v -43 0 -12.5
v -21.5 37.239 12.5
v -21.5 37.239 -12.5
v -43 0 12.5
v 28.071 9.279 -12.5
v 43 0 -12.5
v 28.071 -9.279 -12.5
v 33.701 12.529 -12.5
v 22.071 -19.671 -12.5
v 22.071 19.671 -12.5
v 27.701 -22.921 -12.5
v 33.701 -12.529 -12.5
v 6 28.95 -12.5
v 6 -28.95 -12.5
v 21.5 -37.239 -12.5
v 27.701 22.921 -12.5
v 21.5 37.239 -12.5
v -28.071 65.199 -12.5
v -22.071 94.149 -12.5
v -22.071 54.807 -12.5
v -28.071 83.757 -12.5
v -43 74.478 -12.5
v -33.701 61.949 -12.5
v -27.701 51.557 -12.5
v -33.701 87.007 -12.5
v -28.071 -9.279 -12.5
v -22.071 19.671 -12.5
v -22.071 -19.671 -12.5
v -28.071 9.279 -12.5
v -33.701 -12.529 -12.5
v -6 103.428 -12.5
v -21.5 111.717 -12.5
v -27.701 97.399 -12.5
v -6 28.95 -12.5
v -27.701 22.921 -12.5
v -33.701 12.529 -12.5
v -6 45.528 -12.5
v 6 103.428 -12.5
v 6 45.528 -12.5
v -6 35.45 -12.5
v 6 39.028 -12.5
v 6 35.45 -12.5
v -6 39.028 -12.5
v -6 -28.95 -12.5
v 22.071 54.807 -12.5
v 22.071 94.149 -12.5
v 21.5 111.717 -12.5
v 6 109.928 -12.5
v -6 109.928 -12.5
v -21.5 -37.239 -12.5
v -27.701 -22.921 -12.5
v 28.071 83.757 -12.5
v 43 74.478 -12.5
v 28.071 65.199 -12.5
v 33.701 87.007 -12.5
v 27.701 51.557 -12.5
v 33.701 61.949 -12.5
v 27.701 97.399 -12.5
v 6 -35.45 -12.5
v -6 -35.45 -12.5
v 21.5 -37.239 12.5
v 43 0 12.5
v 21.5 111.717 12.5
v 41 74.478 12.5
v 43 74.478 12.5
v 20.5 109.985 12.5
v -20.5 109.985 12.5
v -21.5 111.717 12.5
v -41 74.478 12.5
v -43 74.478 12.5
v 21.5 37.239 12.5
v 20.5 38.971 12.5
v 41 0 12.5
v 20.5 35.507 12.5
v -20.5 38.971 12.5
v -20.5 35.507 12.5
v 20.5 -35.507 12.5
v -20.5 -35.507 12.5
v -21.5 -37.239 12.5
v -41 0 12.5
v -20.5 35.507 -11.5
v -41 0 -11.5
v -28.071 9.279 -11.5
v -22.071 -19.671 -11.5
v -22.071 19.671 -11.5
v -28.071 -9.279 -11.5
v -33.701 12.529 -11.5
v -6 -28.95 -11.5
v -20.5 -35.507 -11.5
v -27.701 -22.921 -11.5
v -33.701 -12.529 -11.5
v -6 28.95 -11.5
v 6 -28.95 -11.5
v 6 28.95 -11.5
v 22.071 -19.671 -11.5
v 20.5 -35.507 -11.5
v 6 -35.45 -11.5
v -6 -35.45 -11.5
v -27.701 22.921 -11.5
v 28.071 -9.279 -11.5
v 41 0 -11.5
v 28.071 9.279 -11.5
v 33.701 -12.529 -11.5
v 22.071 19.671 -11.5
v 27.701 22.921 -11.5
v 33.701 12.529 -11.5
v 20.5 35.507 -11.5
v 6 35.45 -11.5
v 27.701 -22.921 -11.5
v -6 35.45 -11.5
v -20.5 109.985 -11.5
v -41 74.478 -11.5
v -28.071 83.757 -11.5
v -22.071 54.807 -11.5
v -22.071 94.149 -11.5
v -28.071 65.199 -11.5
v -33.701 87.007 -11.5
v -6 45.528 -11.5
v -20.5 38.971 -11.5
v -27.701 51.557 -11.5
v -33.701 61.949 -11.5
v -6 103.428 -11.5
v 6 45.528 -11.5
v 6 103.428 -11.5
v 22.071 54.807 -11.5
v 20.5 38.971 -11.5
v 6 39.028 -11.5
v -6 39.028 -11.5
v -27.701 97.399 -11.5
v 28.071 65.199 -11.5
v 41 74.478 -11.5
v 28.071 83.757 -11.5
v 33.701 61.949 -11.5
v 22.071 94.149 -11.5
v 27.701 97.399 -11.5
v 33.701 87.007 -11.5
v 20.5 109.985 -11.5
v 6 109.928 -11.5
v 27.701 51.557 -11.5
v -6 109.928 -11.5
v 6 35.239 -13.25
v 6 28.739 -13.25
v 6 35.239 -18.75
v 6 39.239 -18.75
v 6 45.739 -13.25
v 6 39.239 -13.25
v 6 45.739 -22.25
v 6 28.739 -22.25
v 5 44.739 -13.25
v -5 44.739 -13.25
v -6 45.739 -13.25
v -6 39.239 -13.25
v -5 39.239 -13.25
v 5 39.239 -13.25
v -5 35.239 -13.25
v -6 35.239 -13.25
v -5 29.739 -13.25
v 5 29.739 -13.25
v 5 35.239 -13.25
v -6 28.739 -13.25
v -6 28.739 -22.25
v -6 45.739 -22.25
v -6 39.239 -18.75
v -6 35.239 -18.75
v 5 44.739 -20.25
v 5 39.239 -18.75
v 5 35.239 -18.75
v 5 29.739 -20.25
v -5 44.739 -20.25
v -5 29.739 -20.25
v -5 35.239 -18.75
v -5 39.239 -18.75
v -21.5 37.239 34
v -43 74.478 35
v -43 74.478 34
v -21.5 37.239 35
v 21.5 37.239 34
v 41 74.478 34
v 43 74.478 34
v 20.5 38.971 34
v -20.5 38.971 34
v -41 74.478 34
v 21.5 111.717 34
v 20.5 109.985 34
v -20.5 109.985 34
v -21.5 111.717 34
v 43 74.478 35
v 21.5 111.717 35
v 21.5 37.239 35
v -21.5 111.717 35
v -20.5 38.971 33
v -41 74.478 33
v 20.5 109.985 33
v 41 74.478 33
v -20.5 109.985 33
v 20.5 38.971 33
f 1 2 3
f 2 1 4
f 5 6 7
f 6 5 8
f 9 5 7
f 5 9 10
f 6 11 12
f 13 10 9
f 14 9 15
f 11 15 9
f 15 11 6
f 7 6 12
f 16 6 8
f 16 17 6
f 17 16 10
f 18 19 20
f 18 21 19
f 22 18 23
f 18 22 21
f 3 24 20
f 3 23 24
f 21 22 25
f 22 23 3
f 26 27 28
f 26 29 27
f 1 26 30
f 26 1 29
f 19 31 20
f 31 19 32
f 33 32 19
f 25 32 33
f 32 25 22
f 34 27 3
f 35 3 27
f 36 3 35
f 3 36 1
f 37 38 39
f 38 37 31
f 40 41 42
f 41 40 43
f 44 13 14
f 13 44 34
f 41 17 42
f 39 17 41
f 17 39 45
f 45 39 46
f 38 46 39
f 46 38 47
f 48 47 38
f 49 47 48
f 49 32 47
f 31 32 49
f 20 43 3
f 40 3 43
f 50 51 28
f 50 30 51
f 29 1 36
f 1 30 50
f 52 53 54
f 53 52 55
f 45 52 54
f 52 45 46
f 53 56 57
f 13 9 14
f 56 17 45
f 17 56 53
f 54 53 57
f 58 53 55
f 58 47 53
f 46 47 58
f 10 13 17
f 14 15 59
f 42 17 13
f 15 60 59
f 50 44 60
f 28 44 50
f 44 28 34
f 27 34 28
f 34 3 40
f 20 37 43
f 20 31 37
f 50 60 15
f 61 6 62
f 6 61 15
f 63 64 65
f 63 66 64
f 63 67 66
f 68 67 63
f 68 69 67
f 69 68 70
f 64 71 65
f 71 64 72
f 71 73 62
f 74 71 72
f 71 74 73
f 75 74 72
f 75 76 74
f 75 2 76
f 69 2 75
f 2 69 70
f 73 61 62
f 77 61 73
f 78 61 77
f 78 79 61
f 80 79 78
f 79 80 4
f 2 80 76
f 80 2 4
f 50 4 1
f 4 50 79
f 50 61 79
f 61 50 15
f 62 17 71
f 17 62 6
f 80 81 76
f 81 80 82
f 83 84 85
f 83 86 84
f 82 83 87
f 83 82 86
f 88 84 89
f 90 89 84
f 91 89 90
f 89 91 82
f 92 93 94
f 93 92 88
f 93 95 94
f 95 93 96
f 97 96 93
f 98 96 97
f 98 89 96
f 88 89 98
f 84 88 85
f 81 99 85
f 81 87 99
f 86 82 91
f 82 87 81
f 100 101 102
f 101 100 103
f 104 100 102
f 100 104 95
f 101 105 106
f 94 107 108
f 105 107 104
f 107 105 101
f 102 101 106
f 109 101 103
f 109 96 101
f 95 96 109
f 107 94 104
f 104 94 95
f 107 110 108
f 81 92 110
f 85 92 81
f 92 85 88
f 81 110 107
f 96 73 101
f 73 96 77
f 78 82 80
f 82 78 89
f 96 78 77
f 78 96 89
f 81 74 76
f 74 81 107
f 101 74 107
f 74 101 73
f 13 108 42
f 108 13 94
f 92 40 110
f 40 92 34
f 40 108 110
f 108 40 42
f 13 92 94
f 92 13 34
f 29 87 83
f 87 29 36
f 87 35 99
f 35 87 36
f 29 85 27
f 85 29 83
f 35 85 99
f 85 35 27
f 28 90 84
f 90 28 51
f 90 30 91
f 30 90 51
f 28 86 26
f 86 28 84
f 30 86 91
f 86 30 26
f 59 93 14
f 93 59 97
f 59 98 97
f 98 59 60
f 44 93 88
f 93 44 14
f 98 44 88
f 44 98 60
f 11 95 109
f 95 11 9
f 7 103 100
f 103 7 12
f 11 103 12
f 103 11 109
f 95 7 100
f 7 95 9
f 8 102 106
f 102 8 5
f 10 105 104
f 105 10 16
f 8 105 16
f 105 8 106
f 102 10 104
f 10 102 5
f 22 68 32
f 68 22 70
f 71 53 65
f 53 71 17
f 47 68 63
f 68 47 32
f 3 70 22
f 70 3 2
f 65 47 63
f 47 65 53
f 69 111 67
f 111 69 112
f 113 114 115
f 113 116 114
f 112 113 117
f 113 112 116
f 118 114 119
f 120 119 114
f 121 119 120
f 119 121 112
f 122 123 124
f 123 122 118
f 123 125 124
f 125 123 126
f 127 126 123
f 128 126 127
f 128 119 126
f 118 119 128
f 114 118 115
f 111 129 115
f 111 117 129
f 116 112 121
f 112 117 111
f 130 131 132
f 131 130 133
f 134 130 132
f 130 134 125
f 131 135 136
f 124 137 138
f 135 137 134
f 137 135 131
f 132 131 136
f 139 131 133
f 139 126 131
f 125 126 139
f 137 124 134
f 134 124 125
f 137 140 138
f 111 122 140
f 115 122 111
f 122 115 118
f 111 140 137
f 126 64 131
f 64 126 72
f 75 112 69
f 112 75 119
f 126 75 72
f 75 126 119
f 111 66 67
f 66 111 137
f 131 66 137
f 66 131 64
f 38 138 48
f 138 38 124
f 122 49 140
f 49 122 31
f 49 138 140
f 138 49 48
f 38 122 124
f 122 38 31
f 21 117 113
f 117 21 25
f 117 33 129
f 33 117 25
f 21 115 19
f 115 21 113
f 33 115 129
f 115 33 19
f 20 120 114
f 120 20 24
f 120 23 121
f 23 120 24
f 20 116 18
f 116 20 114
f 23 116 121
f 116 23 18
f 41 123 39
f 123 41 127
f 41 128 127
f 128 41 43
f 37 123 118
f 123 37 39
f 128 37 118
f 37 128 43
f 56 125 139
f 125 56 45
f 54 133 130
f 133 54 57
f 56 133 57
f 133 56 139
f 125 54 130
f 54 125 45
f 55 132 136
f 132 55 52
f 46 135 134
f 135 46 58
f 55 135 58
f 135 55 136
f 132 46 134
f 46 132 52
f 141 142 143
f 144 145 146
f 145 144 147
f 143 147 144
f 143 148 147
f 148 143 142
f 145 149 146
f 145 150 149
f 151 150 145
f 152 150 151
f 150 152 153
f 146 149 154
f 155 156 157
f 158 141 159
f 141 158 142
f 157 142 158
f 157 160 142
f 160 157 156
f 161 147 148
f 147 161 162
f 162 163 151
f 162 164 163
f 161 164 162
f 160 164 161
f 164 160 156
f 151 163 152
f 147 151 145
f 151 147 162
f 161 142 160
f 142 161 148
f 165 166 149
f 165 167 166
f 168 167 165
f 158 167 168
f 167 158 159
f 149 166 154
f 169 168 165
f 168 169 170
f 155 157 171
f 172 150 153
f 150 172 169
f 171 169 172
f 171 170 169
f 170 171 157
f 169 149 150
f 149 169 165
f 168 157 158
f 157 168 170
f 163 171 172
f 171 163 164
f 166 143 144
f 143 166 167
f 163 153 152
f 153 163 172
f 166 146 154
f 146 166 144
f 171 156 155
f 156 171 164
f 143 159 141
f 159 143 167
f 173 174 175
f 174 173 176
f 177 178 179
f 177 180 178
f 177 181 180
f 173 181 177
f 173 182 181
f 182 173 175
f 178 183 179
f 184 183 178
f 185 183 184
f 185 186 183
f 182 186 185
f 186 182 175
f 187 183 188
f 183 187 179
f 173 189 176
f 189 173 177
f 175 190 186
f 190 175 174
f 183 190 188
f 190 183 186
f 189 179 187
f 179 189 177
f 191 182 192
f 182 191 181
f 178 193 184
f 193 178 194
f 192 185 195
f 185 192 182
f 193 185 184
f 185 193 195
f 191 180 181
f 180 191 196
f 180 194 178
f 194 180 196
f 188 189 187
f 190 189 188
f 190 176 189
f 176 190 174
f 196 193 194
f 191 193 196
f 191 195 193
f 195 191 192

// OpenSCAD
// file: cololight_tribute_header.scad
/* 
Cololight like hexagon lights
*/

/* 
variable definitions
*/

hex_height=25;
hex_lon_d=86;
hex_short_d=74.478;
hex_incir_rad=43;
hex_lip_depth=1;
diffuser_thickness=2;
diffuser_lip_width=0;
diffuser_edge_thickness=1;
diffuser_clip_thickness=4;
diffuser_clip_wall_thickness=1;
base_thickness=1;
edge_thickness=2;
pin_header_width=8;
pin_header_height=2.5;
clip_mouth_width=12;
clip_mouth_length=6.5;
clip_edge_offset=4.3;

clip_width=12;
clip_length=(2*clip_mouth_length)+(2*edge_thickness);
clip_height=8+base_thickness;
// main file
/* 
Cololight like hexagon lights
*/

include <cololight_tribute_header.scad>

/*
hexagonal light housing
*/

color("grey") 
group() {
    difference() {
        
        difference() {
        
            difference() {
                linear_extrude(height = hex_height, center = true, convexity = 10, twist = 0){
                circle(r=hex_incir_rad, $fn=6);
                }
                translate([0,0,base_thickness]){
                    linear_extrude(height = hex_height, center = true, convexity = 10, twist = 0){
                        circle(r=hex_incir_rad-edge_thickness, $fn=6);
                    }
                }
            }
            
            translate([0,0,(hex_height/2)]){
                linear_extrude(height = diffuser_thickness, center = true, convexity = 10, twist = 0){
                    circle(r=hex_incir_rad-(edge_thickness-diffuser_lip_width), $fn=6);
                }
            }
        }
        
        
        for(a=[0:1:5]){
            rotate([0,0,a*60]) translate([0,hex_incir_rad-clip_mouth_length-clip_edge_offset
        ,0]) {
                cube( size=[clip_mouth_width,clip_mouth_length,hex_height*2], center=true);
            }    
        }    
    
    
        
    }
}

/*
another housing tranlsated in space to show clip interaction
*/

translate([0,hex_short_d,0]){
color("grey", 0.5) 
group() {
    difference() {
        
        difference() {
        
            difference() {
                linear_extrude(height = hex_height, center = true, convexity = 10, twist = 0){
                circle(r=hex_incir_rad, $fn=6);
                }
                translate([0,0,base_thickness]){
                    linear_extrude(height = hex_height, center = true, convexity = 10, twist = 0){
                        circle(r=hex_incir_rad-edge_thickness, $fn=6);
                    }
                }
            }
            
            translate([0,0,(hex_height/2)]){
                linear_extrude(height = diffuser_thickness, center = true, convexity = 10, twist = 0){
                    circle(r=hex_incir_rad-(edge_thickness-diffuser_lip_width), $fn=6);
                }
            }
        }
        
        
        for(a=[0:1:5]){
            rotate([0,0,a*60]) translate([0,hex_incir_rad-clip_mouth_length-clip_edge_offset
        ,0]) {
                cube( size=[clip_mouth_width,clip_mouth_length,hex_height*2], center=true);
            }    
        }    
    
    
        
    }
}
}
/*
translate([0,hex_short_d/2,+30.5]){
    cube( size=[clip_width,clip_length,clip_height], center=true);
}
*/

    
/* 
clip definition
*/
    
// uncomment following and curly to move into place
//translate([0,hex_short_d/2,-11.75]){
translate([0,hex_short_d/2,-17.75]){
color("grey")
group() {
    difference(){
        difference(){
            cube( size=[clip_width,clip_length,clip_height], center=true);

            translate([0,0,edge_thickness]){
                cube( size=[clip_width-edge_thickness,clip_length-edge_thickness,clip_height], center=true);
            }
        }
        
        translate([0,0,base_thickness+pin_header_height]){
            cube( size=[clip_width+2,edge_thickness*2,clip_height], center=true);
            }
            }
            
}
}

/*
diffuser definition
*/
rotate([180,0,0]){
translate([0,-hex_short_d,-35]){
color("white")
    
group() {
    difference() {
    
        color("green")
        linear_extrude(height = diffuser_thickness, center = false, convexity = 10, twist = 0){
            circle(r=hex_incir_rad, $fn=6);
        }
    
    /* 
    diffuser cutting tool definition
    */
        
    translate([0,0,diffuser_edge_thickness]){
        group(){
          
            difference(){
                color("blue")
                linear_extrude(height = diffuser_thickness*2, center = false, convexity = 10, twist = 0){
                    circle(r=hex_incir_rad, $fn=6);
                }
                color("red")
                linear_extrude(height = diffuser_thickness*2, center = false, convexity = 10, twist = 0){
                    circle(r=hex_incir_rad-(edge_thickness-diffuser_lip_width), $fn=6);
                }
            }
        }
    }   
      
    
    }
}
}
}
